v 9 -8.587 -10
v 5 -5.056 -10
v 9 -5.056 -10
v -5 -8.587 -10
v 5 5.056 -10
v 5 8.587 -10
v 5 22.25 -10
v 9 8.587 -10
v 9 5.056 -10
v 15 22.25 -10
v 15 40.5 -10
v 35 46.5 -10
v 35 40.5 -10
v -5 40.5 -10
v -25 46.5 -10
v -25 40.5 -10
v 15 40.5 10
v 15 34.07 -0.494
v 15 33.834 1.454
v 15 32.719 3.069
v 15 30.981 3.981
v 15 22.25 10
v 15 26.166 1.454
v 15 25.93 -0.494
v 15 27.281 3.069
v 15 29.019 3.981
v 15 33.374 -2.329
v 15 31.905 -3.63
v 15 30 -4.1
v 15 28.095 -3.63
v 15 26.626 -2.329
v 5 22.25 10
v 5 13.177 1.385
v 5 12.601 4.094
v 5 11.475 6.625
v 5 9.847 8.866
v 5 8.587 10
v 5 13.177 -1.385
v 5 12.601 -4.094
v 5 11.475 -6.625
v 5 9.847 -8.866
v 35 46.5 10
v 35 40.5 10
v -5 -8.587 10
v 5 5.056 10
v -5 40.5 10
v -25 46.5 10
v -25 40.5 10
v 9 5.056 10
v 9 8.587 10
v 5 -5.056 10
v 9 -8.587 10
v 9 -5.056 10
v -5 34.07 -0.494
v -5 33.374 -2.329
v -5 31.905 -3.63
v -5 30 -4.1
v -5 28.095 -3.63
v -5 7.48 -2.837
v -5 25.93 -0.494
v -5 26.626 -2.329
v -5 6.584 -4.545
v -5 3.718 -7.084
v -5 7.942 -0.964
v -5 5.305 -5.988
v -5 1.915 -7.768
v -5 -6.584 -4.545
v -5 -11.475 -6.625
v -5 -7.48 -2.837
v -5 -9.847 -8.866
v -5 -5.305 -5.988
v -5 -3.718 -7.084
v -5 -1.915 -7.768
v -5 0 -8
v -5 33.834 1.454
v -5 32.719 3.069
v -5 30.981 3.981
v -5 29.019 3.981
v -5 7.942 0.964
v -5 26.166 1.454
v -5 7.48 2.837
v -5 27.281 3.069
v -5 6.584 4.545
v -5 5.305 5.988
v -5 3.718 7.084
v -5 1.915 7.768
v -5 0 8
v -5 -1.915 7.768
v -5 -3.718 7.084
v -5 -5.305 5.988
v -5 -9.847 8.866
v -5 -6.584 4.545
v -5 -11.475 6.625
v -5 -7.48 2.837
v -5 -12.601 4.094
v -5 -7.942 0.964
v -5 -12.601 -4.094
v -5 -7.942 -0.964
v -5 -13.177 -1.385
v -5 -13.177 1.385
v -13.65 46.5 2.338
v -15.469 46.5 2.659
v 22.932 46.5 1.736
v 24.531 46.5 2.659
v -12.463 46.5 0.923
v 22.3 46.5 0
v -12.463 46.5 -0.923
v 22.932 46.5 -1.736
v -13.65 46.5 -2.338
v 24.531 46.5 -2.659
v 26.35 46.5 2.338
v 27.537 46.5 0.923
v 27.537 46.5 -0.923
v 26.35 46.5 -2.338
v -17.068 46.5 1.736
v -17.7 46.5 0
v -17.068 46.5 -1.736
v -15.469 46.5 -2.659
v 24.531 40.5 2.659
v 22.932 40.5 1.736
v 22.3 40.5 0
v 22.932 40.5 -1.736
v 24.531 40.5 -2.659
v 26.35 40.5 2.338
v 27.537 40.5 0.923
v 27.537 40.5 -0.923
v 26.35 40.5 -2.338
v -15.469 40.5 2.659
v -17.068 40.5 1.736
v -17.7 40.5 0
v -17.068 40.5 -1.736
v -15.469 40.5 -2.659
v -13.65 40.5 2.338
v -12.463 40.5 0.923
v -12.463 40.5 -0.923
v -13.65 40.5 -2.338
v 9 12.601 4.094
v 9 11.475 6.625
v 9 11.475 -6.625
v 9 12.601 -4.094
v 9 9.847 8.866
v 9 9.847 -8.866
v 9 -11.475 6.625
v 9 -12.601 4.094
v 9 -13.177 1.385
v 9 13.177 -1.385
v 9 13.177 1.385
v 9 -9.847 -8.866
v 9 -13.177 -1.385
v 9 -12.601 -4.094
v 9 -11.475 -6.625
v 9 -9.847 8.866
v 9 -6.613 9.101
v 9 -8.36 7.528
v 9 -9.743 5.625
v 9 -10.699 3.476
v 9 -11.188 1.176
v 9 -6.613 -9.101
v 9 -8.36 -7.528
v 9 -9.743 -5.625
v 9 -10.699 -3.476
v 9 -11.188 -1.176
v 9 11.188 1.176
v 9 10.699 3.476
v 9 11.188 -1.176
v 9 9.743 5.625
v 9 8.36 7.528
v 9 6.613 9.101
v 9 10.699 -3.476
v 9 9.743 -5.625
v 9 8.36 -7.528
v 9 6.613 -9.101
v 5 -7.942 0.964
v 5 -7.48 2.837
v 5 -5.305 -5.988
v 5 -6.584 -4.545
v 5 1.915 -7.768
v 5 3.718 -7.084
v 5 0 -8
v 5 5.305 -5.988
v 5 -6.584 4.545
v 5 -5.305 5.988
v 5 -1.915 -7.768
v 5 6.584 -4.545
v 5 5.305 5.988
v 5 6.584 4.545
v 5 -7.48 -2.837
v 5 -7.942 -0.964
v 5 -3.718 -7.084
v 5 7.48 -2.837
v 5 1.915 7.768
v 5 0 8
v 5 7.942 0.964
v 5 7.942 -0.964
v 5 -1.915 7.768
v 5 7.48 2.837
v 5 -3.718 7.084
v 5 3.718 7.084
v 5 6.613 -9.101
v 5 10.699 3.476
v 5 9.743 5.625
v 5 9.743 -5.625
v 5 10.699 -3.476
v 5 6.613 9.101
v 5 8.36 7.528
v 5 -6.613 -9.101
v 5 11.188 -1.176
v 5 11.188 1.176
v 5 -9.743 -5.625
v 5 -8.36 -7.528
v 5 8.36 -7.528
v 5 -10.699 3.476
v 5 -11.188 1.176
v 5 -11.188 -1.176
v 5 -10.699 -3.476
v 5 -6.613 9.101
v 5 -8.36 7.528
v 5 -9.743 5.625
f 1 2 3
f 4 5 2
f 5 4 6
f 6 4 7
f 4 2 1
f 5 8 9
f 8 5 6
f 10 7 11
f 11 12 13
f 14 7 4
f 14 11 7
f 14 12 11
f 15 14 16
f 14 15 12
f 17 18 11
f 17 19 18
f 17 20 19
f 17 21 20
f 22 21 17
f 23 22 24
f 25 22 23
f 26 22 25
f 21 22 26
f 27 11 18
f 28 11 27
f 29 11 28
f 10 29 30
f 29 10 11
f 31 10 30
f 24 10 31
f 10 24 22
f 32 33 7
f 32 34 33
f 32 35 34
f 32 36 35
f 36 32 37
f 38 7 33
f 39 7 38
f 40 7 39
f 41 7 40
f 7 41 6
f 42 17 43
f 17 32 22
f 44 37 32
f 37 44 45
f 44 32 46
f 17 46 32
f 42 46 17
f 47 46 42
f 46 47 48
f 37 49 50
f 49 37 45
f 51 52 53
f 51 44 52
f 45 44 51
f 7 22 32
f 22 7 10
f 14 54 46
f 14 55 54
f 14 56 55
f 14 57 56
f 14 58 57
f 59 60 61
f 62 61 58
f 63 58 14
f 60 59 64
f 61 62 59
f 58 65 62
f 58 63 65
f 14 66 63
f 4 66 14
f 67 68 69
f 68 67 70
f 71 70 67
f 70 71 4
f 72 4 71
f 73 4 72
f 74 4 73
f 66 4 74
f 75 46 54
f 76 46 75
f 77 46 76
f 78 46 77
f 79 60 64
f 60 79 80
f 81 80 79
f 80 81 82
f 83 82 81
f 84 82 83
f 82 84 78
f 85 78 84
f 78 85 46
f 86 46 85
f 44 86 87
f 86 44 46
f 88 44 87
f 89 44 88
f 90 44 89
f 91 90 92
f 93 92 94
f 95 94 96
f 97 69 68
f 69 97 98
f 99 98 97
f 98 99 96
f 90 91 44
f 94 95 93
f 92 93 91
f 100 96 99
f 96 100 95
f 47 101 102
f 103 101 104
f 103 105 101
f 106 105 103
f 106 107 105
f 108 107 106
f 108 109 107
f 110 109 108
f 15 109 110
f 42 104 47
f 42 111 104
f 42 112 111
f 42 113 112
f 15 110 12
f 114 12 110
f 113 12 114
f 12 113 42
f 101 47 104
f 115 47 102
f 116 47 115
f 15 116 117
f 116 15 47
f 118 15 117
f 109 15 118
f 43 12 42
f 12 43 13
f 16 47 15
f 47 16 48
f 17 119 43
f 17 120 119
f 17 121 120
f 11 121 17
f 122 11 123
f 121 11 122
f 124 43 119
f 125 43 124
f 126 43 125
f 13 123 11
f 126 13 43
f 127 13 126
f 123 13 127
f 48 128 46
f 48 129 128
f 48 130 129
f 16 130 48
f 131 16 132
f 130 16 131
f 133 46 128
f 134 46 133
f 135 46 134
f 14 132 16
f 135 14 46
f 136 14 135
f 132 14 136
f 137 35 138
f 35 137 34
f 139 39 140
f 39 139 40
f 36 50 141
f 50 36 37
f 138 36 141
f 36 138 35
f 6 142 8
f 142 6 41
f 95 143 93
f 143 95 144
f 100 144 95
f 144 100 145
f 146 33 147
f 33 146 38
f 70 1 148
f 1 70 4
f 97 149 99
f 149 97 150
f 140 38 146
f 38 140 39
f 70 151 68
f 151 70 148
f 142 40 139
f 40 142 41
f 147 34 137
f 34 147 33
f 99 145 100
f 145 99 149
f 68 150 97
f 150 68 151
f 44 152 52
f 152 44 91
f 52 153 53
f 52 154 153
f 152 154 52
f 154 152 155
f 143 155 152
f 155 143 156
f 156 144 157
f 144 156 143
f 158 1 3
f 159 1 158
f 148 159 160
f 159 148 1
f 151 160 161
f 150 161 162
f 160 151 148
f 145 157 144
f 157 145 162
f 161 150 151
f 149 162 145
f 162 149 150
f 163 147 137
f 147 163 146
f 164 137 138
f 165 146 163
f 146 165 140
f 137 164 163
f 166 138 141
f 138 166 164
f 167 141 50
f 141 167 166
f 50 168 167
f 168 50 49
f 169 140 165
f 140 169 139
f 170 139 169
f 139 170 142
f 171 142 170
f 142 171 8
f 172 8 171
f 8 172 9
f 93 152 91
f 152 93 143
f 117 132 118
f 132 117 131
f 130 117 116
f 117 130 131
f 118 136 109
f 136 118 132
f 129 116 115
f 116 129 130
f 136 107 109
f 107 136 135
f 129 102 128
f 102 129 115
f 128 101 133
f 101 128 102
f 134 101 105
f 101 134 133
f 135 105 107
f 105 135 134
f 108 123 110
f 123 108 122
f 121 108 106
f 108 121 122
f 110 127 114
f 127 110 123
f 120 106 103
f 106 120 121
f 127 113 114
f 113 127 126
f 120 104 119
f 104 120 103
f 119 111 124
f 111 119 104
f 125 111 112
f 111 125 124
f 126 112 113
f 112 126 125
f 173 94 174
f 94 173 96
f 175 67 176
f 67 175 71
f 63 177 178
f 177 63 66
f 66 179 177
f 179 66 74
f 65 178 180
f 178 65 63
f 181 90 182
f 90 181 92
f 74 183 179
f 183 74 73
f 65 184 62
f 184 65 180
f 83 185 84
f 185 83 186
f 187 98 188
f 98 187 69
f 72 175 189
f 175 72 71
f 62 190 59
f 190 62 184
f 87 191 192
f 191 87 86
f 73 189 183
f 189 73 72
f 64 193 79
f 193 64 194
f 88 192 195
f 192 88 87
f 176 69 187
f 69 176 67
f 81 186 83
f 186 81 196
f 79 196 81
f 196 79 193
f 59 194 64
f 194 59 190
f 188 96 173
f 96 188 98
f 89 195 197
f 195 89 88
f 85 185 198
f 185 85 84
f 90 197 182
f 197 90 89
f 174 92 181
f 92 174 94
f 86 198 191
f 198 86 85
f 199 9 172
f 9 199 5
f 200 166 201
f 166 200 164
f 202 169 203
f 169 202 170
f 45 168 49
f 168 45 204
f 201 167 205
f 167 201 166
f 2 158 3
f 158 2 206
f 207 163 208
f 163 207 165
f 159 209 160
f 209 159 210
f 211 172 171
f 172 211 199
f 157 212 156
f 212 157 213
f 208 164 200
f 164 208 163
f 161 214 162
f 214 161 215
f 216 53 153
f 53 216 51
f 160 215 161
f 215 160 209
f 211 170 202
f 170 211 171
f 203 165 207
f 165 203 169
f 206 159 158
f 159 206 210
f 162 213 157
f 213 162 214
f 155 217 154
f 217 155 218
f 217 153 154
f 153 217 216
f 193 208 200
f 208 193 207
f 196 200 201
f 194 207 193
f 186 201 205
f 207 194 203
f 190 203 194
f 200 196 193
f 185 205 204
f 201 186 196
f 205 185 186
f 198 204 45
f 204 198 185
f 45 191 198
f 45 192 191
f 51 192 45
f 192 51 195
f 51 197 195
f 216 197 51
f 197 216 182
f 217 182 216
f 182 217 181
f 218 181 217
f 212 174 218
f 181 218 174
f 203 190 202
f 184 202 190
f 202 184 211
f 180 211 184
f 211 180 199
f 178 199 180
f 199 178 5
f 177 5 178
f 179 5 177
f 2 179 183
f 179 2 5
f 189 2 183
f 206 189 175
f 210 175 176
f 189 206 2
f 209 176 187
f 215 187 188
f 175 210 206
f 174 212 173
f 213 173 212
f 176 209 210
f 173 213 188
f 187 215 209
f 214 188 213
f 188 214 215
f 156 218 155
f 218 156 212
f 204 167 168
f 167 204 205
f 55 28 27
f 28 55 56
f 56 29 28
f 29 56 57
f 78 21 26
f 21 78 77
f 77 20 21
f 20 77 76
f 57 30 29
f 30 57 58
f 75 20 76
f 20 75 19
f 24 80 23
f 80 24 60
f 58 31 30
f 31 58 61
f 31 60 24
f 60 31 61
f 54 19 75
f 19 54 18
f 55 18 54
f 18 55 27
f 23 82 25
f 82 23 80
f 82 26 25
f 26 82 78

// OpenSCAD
// file: Rook_Config.scad
// Rook 3D Printer Configuration
// Created By Jeffrey Olijar 
// Jolijar@gmail.com

// Layer Height
LH = 0.38;

// 608 skate bearing
Bearing_OD = 22.5; 
Bearing_ID = 8;
Bearing_H = 7;

// M3 Nut Diameter
N3 = 7.5;

// M3 Screw Hole Diameter
M3 = 3.5;

// M4 Screw Hole Diameter
M4 = 5.25;
N4 = 9;

// M5 Screw Hole Diameter
M5 = 5.4;

// M8 Rod Diameter (configure for a tight fit)
M8 = 8.2;

// M8 Nut Diameter
N8 = 15.5;

//LM8UU Bearing
LBD = 15.4; // Diameter
LBH = 25; // Height
LBI = 8;  // Inner Diameter

//Makergear Groovemount
GVO = 16.5; // Outside Diameter
GVI = 12.5;  // Inside Groove Diameter

// Distance Between Centers for X rods
DBCX = 70;
// main file
// Rook 3D Printer 
// Z Rod Holder
// Created By Jeffrey Olijar 
// Jolijar@gmail.com
// Revision 1.01
// 2 x requred 

include <Rook_Config.scad>

module Rook_Z_Holder(){

rotate(a=[0,90,0]){
difference(){


	union(){

	
			translate(v=[0,32.25,10]){
				cube(size = [20,20,10], center = true);
				}
		
			
			translate(v=[0,19+Bearing_ID,0]){
				cube(size = [20,39,10], center = true);
				}
			translate(v=[0,43.5,5]){
				cube(size = [20,6,60], center = true);
				}
			translate(v=[0,0,-5]){
				cylinder(h = Bearing_H*2, r=(Bearing_OD/2)+2);
			}}


	union(){
translate(v=[15,44,5]){
					cube(size = [10,500,120], center = true);
}
translate(v=[-15,44,5]){
					cube(size = [10,500,120], center = true);
}
		translate(v=[0,55,-15])rotate(a=[90,90,0]){
			cylinder(h=200,r=M5/2);
				translate(v=[-40,0,0]){
					cylinder(h=200,r=M5/2);
			}}
	
		translate(v=[0,0,-5]){
			cylinder(h = Bearing_H*2, r=Bearing_ID);
			}
		translate(v=[0,0,Bearing_H-2]){
			cylinder(h = Bearing_H, r=Bearing_OD/2);
			}
		translate(v=[0,30,-10]){
			cylinder(h=80,r=M8/2);
}}}}}
Rook_Z_Holder();
